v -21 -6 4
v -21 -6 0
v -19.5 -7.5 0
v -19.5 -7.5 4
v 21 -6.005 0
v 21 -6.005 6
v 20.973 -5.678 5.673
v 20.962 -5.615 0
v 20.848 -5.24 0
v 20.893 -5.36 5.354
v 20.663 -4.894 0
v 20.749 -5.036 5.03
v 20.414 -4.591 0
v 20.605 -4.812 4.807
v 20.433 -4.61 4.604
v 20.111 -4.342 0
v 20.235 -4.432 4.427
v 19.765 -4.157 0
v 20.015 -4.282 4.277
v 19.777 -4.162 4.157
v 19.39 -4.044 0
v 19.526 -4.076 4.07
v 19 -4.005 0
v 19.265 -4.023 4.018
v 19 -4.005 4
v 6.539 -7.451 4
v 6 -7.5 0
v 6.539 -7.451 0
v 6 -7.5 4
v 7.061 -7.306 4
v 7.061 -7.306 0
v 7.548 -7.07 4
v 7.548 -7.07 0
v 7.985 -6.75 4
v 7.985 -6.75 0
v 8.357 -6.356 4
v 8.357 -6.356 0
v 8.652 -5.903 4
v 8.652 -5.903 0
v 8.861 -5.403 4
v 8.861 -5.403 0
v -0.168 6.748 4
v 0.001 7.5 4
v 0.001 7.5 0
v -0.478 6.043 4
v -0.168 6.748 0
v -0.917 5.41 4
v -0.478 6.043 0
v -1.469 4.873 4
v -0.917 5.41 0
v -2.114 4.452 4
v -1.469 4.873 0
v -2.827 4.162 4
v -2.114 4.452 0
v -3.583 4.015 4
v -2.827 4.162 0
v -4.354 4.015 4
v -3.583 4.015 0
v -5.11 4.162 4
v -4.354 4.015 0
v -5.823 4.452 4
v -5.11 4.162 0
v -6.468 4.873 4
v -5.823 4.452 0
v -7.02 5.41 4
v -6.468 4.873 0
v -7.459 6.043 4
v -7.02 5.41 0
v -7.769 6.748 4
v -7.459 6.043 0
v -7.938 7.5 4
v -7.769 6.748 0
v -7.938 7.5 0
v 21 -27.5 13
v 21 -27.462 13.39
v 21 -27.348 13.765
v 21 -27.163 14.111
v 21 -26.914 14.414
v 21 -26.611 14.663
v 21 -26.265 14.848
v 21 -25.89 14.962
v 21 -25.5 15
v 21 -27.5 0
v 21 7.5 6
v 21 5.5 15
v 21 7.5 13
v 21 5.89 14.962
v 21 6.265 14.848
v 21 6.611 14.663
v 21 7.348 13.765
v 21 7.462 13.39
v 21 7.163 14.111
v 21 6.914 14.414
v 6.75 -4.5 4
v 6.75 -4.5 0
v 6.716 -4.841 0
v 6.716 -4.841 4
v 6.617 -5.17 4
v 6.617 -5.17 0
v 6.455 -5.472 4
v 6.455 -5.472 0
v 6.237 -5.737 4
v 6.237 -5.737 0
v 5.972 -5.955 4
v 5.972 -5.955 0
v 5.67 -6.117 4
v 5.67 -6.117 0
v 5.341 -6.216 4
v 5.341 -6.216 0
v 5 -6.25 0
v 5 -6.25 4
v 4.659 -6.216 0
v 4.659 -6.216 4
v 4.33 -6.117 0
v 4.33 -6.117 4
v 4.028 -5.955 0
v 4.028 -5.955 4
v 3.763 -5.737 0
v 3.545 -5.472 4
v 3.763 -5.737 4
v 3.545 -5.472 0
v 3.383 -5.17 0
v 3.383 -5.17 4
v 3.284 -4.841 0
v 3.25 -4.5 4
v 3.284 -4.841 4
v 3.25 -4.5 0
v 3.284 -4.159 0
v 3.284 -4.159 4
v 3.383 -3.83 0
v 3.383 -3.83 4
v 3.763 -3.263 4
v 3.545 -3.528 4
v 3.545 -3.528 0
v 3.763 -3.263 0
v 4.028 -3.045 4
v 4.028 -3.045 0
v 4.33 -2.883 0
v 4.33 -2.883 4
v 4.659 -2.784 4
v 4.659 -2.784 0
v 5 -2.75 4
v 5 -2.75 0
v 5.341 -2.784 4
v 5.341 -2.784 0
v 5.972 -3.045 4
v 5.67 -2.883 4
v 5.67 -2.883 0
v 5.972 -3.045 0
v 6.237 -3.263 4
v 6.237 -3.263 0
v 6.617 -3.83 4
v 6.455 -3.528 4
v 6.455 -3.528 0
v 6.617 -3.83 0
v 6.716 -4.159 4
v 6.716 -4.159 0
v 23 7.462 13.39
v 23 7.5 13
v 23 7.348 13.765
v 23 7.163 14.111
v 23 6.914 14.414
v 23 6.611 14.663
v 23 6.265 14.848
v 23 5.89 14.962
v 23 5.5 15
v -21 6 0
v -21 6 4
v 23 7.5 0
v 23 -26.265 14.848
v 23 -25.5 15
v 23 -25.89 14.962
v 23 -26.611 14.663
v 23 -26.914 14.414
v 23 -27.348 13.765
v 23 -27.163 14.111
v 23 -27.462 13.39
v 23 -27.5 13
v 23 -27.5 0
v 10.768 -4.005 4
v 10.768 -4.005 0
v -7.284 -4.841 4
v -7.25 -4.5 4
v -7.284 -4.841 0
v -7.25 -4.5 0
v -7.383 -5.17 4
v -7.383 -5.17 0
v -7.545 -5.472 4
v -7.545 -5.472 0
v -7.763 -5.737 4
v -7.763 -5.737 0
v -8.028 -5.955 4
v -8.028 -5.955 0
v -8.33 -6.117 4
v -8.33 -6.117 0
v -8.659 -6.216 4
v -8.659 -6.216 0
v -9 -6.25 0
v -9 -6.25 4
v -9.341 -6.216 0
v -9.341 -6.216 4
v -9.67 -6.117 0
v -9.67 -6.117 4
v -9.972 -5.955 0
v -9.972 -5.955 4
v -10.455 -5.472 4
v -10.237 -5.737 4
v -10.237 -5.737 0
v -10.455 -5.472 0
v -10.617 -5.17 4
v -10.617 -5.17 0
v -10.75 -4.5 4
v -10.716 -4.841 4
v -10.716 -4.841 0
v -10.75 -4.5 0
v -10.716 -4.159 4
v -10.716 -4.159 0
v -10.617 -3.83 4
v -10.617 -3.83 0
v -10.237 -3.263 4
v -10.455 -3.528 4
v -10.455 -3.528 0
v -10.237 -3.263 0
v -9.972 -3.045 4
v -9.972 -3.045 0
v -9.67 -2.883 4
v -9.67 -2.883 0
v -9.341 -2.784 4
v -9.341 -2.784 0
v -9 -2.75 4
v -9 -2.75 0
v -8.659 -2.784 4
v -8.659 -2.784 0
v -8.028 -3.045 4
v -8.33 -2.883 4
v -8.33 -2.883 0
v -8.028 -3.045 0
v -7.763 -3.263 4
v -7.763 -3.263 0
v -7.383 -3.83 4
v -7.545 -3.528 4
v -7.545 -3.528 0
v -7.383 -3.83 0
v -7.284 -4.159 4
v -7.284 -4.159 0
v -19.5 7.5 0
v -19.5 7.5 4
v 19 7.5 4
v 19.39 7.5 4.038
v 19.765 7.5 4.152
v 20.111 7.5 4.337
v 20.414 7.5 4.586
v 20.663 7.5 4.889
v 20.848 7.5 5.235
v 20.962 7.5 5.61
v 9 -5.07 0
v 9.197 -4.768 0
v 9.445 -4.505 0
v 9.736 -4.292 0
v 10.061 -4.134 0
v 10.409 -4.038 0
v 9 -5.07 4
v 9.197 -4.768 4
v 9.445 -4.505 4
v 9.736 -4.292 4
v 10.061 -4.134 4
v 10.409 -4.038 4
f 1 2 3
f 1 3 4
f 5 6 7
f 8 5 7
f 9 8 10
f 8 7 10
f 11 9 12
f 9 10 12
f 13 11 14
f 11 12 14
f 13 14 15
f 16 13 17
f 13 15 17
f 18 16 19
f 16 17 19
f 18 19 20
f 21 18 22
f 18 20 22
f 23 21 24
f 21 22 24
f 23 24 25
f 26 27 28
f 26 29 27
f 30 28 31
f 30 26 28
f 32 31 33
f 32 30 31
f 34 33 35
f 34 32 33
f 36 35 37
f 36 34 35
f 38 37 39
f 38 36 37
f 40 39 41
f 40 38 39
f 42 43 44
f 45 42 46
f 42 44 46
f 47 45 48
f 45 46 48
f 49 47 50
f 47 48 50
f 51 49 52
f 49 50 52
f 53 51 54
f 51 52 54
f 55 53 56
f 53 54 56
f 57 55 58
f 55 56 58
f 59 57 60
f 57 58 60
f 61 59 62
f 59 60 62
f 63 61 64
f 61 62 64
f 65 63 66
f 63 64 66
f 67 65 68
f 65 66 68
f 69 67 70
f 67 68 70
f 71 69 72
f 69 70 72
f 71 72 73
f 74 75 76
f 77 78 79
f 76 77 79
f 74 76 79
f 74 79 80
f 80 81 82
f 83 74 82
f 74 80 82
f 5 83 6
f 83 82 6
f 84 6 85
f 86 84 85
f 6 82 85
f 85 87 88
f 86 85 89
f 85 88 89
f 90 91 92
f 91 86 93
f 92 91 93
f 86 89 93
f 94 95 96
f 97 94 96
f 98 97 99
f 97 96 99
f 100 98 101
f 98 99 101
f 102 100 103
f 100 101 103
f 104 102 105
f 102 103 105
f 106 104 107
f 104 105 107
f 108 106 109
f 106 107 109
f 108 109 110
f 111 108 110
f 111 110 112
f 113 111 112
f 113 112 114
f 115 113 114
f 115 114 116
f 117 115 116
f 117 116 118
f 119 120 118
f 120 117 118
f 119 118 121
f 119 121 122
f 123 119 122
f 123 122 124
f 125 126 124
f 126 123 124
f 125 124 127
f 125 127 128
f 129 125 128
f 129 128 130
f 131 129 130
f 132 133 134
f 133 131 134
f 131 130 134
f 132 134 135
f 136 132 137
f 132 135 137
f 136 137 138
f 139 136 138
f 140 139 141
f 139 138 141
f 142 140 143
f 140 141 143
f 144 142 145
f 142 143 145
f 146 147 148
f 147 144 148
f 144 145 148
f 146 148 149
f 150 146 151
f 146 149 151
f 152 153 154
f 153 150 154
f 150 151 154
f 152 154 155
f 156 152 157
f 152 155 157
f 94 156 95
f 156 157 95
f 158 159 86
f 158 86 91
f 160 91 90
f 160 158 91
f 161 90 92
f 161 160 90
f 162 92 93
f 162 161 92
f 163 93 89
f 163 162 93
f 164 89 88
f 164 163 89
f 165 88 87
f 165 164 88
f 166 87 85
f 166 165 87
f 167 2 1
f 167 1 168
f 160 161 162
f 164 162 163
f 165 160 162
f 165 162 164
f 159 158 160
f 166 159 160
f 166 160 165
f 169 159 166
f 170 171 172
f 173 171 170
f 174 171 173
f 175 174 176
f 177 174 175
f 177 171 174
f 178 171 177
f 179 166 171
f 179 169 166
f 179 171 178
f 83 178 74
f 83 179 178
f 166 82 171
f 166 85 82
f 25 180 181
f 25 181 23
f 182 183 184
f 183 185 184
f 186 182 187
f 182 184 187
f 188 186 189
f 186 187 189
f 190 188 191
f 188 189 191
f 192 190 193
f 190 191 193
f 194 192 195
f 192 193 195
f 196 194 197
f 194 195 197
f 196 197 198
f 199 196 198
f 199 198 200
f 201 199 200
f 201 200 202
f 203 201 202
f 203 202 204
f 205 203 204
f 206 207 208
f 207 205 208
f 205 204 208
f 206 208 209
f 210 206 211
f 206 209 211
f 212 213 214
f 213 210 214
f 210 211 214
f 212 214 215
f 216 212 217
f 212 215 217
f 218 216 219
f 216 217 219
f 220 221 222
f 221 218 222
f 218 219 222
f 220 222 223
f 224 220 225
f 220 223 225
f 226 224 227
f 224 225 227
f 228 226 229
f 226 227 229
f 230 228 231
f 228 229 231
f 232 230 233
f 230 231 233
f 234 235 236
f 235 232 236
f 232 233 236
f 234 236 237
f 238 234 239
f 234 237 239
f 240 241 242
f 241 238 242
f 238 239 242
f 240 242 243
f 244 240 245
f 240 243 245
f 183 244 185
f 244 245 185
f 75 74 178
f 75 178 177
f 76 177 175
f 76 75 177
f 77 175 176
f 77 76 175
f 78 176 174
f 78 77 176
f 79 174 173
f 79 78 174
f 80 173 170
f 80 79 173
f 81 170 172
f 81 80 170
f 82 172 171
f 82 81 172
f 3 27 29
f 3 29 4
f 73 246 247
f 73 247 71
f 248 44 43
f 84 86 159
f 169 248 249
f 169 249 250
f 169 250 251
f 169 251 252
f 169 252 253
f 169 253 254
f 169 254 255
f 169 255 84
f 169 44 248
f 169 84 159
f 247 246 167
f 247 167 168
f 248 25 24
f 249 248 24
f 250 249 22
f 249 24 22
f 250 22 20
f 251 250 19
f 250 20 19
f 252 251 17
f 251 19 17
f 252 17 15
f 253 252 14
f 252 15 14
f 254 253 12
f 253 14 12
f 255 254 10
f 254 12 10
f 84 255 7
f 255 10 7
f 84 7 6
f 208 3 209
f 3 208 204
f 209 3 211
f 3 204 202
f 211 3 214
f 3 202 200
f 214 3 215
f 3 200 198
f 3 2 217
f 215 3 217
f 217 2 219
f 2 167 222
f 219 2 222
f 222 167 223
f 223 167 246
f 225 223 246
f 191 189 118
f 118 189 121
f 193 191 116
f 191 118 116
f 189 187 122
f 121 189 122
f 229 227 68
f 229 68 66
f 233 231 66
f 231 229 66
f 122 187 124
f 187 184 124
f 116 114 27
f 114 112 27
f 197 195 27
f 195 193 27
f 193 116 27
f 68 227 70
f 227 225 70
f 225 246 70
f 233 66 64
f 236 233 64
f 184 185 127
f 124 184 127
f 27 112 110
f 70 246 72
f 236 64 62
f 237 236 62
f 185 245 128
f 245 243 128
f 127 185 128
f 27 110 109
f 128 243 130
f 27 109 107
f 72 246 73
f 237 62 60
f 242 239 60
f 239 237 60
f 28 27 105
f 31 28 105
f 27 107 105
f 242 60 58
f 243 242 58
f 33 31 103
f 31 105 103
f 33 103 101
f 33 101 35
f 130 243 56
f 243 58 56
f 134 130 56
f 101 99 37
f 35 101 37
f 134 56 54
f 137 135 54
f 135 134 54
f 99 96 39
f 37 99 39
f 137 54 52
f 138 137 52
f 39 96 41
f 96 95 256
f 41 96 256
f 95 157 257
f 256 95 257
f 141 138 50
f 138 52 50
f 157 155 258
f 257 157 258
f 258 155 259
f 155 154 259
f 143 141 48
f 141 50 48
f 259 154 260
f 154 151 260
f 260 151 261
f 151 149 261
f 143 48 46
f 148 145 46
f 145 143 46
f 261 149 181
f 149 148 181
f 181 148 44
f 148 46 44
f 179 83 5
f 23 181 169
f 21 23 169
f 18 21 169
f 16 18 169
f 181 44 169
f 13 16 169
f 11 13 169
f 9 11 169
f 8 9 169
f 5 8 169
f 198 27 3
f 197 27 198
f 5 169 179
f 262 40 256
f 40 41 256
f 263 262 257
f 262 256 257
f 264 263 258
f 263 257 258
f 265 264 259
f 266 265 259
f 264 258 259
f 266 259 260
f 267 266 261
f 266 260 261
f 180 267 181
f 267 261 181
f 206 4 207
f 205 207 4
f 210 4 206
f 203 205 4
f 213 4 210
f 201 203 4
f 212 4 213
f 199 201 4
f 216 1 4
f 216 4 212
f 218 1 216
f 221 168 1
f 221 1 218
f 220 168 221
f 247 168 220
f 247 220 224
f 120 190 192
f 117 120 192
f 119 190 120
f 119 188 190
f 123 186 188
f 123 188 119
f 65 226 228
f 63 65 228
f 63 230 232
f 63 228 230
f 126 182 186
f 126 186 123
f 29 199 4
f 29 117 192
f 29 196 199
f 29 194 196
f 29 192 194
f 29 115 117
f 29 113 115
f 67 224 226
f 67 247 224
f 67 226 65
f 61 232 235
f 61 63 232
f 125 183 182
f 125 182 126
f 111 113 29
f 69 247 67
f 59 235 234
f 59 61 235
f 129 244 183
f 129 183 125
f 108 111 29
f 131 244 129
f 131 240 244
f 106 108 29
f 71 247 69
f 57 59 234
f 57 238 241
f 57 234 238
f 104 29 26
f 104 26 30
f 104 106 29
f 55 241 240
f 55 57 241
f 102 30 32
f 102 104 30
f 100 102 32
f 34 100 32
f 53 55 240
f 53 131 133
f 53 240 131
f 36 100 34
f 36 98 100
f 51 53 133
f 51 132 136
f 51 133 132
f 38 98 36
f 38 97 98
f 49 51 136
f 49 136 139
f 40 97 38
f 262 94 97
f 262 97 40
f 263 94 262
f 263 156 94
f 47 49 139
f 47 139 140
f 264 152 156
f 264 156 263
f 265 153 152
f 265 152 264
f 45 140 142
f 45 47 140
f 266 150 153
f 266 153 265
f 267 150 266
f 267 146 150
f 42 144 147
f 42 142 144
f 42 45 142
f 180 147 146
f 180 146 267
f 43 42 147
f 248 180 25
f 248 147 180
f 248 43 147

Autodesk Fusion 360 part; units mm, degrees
sketch "Esquisse1" plane through (0, 0, 0) normal (0, 0, 1) x (1, 0, 0)
  line L0 (21, -7.5) -> (-21, -7.5)
  line L1 (-21, -7.5) -> (-21, 7.5)
  line L2 (21, 7.5) -> (21, -7.5)
  line L3 (21, -7.5) -> (-21, 7.5) construction
  line L4 (-21, -7.5) -> (21, 7.5) construction
  circle A0 centre (5, -4.5) radius 1.75
  circle A1 centre (-9, -4.5) radius 1.75
  line L5 (-9, -4.5) -> (5, -4.5) construction
  line L6 (-9, -4.5) -> (-9, -7.5) construction
  line L7 (-9, -4.5) -> (-21, -4.5) construction
  line L8 (5, -4.5) -> (21, -4.5) construction
  line L9 (-21, 7.5) -> (21, 7.5)
  line L10 (-21, 7.5) -> (-4, 7.5)
  line L11 (-4, 9) -> (-4, 5.805) construction
  dimension "d1" = 42
  dimension "d2" = 15
  dimension "d3" = 3.5
  dimension "d4" = 3.5
  dimension "d6" = 3
  dimension "d42" = 12
  dimension "d43" = 14
  dimension "d44" = 16
  dimension "d64" = 17
extrude "Extrusion1" add sketch "Esquisse1" along normal blind 4
sketch "Esquisse6" plane through (0, 0, 0) normal (0, 0, 1) x (1, 0, 0)
  line L0 (21, 7.5) -> (23, 7.5)
  line L1 (23, 7.5) -> (23, -27.5)
  line L2 (23, -27.5) -> (21, -27.5)
  line L3 (21, -27.5) -> (21, 7.5)
  dimension "d45" = 2
  dimension "d46" = 35
extrude "Extrusion6" add sketch "Esquisse6" along normal blind 15
sketch "Esquisse7" plane through (0, 0, 4) normal (0, 0, 1) x (-1, 0, 0)
  circle A0 centre (-5, 4.5) radius 1.75
  circle A1 centre (9, 4.5) radius 1.75
  line L0 (21, -7.5) -> (21, 7.5)
  line L1 (21, 7.5) -> (-21, 7.5)
  line L2 (-21, 7.5) -> (-21, -7.5)
  line L3 (-21, -7.5) -> (21, -7.5)
  line L4 (-21, 4.0051) -> (-21, 7.5)
  line L5 (-21, 7.5) -> (-5, 7.5)
  line L6 (-8.9589, 4.0051) -> (-21, 4.0051)
  arc A2 (-6, 7.5) -> (-8.9589, 4.0051) centre (-6, 4.5) ccw
  dimension "d70" = 6
extrude "Extrusion7" cut sketch "Esquisse7" against normal blind 4 contours L1 L2 L4 L5 L6 A2
chamfer "Chanfrein3" distance 1.5 angle 45 1 edges at (-21, -7.5, 2)
fillet "Congé10" radius 2 1 edges at (21, 1.7475, 4)
fillet "Congé11" radius 2 1 edges at (21, -4.0051, 3)
fillet "Congé12" radius 2 1 edges at (22, 7.5, 15)
fillet "Congé13" radius 2 1 edges at (22, -27.5, 15)
hole "Perçage1" at (-3.9685, 7.9961, 4) direction (0, 0, -1) diameter 8 end through all
chamfer "Chanfrein5" distance 1.5 angle 45 1 edges at (-21, 7.5, 2)
fillet "Congé14" radius 2 1 edges at (8.9589, -4.0051, 2)
